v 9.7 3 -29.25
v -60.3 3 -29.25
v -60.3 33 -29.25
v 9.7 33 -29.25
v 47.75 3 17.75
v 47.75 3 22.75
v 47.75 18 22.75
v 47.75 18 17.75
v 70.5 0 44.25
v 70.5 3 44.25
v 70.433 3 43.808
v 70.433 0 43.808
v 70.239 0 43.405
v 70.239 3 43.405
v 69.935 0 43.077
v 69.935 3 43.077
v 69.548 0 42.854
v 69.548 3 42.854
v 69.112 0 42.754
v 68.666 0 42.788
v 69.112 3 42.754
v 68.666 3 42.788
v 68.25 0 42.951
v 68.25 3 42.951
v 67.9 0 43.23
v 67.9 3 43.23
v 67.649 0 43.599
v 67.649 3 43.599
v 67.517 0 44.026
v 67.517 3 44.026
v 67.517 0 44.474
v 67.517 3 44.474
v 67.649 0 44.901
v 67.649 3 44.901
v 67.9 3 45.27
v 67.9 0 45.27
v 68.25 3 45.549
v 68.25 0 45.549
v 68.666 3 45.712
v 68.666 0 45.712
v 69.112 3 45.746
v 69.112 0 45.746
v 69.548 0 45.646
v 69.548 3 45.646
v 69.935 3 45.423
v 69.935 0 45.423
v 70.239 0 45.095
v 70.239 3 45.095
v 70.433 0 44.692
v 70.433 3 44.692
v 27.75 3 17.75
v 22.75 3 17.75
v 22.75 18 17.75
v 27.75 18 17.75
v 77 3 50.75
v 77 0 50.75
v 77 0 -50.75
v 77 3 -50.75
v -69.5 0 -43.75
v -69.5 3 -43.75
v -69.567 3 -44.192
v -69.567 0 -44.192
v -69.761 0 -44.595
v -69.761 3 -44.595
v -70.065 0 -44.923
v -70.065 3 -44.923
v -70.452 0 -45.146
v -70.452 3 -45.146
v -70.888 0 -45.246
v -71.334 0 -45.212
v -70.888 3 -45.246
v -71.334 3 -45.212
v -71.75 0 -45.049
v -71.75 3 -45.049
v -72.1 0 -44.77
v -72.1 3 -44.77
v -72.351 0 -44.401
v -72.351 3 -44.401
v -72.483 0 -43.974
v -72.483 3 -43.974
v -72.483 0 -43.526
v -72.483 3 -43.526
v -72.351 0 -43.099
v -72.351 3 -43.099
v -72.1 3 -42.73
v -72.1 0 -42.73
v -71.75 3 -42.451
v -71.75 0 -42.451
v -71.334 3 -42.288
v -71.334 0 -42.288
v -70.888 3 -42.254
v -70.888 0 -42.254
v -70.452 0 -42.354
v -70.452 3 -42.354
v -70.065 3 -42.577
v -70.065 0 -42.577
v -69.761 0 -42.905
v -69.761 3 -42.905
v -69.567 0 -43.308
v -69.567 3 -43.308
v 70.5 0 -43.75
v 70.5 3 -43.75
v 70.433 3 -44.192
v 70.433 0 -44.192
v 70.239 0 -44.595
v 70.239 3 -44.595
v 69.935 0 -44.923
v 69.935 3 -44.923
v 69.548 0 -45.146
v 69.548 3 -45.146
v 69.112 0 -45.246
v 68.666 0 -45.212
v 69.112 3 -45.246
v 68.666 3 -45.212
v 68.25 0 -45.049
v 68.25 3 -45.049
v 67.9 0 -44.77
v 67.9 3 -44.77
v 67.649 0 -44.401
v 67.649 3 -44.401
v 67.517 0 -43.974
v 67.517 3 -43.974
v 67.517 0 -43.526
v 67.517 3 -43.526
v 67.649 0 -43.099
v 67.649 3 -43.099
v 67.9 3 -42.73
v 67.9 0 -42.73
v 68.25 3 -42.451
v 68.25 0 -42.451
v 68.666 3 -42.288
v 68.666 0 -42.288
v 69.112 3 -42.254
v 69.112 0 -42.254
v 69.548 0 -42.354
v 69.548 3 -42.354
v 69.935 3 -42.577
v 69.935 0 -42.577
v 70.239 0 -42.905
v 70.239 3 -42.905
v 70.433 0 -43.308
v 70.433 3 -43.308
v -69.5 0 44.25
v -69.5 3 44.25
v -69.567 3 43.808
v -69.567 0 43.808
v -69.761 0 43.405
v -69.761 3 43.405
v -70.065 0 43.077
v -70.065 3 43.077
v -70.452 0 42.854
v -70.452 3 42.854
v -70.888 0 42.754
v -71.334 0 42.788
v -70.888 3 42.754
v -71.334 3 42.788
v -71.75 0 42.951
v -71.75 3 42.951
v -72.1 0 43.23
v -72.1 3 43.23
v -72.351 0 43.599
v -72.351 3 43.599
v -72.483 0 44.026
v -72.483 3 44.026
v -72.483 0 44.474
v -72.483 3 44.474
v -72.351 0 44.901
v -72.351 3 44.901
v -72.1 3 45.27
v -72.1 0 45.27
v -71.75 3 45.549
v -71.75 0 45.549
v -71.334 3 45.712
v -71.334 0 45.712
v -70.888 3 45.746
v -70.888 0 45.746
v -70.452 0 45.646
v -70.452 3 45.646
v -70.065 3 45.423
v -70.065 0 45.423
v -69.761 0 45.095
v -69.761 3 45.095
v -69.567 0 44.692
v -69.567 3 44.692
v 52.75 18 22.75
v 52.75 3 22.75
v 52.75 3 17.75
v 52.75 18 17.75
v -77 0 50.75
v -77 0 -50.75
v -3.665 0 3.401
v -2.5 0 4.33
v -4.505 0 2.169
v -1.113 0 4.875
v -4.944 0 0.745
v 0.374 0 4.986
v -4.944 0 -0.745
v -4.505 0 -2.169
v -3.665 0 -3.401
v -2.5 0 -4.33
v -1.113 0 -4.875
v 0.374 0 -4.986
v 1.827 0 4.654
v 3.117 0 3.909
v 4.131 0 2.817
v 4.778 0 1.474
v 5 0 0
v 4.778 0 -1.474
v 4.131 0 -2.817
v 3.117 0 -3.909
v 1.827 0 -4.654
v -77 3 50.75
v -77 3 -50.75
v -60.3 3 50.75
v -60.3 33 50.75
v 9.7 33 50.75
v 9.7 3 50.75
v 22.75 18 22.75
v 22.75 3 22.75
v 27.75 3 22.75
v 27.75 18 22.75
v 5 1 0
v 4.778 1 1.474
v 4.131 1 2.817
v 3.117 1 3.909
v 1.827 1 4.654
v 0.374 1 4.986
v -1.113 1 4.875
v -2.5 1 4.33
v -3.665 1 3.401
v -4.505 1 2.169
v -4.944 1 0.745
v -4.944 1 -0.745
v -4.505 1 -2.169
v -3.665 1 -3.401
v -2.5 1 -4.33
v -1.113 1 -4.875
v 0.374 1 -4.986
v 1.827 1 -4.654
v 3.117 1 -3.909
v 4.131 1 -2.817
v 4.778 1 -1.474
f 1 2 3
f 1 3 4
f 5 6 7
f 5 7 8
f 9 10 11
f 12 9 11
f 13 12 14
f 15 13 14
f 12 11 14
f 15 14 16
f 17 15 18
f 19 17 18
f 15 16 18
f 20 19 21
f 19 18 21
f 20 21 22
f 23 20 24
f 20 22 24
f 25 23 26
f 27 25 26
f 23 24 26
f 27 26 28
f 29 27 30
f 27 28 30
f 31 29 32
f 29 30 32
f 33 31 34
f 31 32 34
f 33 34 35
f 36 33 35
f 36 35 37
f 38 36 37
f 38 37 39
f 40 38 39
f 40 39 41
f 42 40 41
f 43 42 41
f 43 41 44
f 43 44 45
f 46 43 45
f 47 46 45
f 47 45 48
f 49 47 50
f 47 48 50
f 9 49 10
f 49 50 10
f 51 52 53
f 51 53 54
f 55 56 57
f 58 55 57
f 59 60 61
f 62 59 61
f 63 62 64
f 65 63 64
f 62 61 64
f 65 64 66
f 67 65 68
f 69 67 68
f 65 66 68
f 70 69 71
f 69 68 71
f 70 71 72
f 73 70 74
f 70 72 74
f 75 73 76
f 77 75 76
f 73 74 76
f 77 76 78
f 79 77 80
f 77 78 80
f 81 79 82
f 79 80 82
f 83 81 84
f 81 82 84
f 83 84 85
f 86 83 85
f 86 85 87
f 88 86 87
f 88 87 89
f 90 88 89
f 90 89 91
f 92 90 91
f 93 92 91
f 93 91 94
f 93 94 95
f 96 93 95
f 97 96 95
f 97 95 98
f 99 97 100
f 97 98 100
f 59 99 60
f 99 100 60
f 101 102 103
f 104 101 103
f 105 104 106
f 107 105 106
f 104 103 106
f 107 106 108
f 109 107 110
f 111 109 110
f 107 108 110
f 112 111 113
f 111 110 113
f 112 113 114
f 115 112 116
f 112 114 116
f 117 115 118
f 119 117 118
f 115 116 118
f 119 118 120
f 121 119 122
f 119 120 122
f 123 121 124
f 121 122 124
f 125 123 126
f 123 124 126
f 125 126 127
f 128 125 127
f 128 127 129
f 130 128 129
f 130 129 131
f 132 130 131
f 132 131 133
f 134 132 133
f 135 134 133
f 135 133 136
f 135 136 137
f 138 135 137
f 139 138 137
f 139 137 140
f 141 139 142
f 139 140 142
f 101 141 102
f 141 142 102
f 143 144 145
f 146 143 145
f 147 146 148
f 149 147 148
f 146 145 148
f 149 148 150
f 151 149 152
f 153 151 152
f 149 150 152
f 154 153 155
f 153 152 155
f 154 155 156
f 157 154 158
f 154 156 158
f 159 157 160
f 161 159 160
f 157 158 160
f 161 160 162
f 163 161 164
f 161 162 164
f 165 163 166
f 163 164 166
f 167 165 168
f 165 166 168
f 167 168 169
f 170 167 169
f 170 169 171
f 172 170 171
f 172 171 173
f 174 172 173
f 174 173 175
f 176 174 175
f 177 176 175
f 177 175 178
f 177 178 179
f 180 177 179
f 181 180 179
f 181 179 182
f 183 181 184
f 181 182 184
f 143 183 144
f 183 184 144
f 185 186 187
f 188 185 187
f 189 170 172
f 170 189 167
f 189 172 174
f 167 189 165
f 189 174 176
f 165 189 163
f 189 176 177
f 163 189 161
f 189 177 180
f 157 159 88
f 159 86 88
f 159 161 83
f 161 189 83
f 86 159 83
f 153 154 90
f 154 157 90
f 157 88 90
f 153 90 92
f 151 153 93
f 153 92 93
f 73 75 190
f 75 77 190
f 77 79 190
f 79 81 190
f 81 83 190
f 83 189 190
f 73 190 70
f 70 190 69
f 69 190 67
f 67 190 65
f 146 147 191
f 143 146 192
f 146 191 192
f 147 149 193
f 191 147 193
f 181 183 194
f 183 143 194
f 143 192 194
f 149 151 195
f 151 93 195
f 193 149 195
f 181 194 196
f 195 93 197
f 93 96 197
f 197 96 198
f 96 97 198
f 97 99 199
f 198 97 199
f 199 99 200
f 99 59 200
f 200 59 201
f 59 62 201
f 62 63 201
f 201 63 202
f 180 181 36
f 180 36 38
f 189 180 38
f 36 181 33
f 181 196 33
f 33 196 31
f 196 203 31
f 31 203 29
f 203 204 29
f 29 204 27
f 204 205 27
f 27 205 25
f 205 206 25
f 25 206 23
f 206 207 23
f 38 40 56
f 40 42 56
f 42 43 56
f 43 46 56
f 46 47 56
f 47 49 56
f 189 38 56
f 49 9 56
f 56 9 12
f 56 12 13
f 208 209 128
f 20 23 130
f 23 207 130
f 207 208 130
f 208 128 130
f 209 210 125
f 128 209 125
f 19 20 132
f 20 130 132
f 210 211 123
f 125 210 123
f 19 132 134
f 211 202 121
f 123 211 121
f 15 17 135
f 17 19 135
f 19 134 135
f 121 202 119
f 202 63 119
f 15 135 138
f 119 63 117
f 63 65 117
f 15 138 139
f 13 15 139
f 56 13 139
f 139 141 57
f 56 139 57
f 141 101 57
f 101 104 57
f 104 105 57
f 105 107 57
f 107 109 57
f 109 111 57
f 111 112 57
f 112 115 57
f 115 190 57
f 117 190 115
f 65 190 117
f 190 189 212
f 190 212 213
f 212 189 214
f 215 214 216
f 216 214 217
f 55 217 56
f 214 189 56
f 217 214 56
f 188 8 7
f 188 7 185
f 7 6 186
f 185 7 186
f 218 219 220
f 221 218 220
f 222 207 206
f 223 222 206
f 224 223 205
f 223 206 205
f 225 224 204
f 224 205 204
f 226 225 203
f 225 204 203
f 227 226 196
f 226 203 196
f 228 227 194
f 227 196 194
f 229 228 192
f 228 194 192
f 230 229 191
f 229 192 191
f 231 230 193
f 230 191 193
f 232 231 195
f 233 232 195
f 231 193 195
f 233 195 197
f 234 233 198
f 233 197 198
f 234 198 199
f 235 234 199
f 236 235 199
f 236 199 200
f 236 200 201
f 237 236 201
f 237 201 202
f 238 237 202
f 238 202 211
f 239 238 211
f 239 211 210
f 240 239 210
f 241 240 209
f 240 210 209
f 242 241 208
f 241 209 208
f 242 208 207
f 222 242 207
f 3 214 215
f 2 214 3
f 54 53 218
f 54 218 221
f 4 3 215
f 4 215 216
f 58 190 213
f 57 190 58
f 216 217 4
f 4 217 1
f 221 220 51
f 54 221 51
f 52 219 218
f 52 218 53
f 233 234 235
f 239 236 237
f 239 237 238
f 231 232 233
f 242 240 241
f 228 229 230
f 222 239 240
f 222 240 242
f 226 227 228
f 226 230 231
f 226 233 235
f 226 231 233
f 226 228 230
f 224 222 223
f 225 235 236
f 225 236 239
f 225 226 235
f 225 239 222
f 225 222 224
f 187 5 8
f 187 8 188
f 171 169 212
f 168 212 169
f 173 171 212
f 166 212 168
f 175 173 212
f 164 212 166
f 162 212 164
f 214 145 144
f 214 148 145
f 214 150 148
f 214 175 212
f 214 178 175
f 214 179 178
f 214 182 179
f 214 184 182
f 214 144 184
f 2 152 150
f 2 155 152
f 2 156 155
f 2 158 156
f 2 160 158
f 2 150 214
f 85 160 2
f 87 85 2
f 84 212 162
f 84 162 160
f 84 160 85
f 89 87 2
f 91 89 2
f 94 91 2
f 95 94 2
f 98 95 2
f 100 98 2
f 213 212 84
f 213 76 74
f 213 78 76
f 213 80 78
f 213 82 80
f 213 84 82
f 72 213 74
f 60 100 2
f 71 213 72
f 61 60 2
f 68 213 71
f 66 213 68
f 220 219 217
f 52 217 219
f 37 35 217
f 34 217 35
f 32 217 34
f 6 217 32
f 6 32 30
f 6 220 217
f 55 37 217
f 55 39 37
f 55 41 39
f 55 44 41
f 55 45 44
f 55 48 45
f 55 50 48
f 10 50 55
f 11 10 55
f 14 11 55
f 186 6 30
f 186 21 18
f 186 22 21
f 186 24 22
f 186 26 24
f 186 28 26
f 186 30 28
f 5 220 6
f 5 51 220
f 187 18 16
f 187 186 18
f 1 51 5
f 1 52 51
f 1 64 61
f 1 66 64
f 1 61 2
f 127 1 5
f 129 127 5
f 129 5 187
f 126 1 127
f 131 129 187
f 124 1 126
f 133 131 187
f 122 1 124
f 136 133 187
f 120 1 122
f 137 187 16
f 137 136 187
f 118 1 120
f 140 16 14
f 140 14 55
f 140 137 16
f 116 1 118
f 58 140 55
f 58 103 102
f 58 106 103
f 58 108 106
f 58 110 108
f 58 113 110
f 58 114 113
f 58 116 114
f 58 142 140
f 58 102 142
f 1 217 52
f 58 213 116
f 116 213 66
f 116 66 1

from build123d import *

# Parameters (mm, degrees)
ESQUISSE1_W             = 154
ESQUISSE1_H             = 101.5
BOSS_EXTRU_1_DEPTH      = 3
ESQUISSE2_R             = 1.5
ENL_V_MAT_EXTRU_1_DEPTH = 3
ESQUISSE3_W             = 70
ESQUISSE3_H             = 80
BOSS_EXTRU_2_DEPTH      = 30
ESQUISSE4_W             = 5
ESQUISSE4_H             = 5
BOSS_EXTRU_3_DEPTH      = 15
ESQUISSE5_R             = 5
ENL_V_MAT_EXTRU_2_DEPTH = 1


with BuildPart() as part:
    # Esquisse1 → Boss.-Extru.1 (new body)
    with BuildSketch(Plane(origin=(0, 0, 0), x_dir=(1, 0, 0), z_dir=(0, 1, 0))):
        Rectangle(ESQUISSE1_W, ESQUISSE1_H)
    extrude(amount=BOSS_EXTRU_1_DEPTH)

    # Esquisse2 → Enlèv. mat.-Extru.1 (cut)
    with BuildSketch(Plane(origin=(0, 3, 0), x_dir=(1, 0, 0), z_dir=(0, 1, 0))):
        with Locations((-71, 43.75)):
            Circle(ESQUISSE2_R)
        with Locations((69, 43.75)):
            Circle(ESQUISSE2_R)
        with Locations((-71, -44.25)):
            Circle(ESQUISSE2_R)
        with Locations((69, -44.25)):
            Circle(ESQUISSE2_R)
    extrude(amount=-ENL_V_MAT_EXTRU_1_DEPTH, mode=Mode.SUBTRACT)

    # Esquisse3 → Boss.-Extru.2 (add)
    with BuildSketch(Plane(origin=(0, 3, 0), x_dir=(1, 0, 0), z_dir=(0, 1, 0))):
        with Locations((-25.3, -10.75)):
            Rectangle(ESQUISSE3_W, ESQUISSE3_H)
    extrude(amount=BOSS_EXTRU_2_DEPTH)

    # Esquisse4 → Boss.-Extru.3 (add)
    with BuildSketch(Plane(origin=(0, 3, 0), x_dir=(1, 0, 0), z_dir=(0, 1, 0))):
        with Locations((25.25, -20.25)):
            Rectangle(ESQUISSE4_W, ESQUISSE4_H)
        with Locations((50.25, -20.25)):
            Rectangle(ESQUISSE4_W, ESQUISSE4_H)
    extrude(amount=BOSS_EXTRU_3_DEPTH)

    # Esquisse5 → Enlèv. mat.-Extru.2 (cut)
    with BuildSketch(Plane.XZ):
        Circle(ESQUISSE5_R)
    extrude(amount=-ENL_V_MAT_EXTRU_2_DEPTH, mode=Mode.SUBTRACT)


solid = part.part
